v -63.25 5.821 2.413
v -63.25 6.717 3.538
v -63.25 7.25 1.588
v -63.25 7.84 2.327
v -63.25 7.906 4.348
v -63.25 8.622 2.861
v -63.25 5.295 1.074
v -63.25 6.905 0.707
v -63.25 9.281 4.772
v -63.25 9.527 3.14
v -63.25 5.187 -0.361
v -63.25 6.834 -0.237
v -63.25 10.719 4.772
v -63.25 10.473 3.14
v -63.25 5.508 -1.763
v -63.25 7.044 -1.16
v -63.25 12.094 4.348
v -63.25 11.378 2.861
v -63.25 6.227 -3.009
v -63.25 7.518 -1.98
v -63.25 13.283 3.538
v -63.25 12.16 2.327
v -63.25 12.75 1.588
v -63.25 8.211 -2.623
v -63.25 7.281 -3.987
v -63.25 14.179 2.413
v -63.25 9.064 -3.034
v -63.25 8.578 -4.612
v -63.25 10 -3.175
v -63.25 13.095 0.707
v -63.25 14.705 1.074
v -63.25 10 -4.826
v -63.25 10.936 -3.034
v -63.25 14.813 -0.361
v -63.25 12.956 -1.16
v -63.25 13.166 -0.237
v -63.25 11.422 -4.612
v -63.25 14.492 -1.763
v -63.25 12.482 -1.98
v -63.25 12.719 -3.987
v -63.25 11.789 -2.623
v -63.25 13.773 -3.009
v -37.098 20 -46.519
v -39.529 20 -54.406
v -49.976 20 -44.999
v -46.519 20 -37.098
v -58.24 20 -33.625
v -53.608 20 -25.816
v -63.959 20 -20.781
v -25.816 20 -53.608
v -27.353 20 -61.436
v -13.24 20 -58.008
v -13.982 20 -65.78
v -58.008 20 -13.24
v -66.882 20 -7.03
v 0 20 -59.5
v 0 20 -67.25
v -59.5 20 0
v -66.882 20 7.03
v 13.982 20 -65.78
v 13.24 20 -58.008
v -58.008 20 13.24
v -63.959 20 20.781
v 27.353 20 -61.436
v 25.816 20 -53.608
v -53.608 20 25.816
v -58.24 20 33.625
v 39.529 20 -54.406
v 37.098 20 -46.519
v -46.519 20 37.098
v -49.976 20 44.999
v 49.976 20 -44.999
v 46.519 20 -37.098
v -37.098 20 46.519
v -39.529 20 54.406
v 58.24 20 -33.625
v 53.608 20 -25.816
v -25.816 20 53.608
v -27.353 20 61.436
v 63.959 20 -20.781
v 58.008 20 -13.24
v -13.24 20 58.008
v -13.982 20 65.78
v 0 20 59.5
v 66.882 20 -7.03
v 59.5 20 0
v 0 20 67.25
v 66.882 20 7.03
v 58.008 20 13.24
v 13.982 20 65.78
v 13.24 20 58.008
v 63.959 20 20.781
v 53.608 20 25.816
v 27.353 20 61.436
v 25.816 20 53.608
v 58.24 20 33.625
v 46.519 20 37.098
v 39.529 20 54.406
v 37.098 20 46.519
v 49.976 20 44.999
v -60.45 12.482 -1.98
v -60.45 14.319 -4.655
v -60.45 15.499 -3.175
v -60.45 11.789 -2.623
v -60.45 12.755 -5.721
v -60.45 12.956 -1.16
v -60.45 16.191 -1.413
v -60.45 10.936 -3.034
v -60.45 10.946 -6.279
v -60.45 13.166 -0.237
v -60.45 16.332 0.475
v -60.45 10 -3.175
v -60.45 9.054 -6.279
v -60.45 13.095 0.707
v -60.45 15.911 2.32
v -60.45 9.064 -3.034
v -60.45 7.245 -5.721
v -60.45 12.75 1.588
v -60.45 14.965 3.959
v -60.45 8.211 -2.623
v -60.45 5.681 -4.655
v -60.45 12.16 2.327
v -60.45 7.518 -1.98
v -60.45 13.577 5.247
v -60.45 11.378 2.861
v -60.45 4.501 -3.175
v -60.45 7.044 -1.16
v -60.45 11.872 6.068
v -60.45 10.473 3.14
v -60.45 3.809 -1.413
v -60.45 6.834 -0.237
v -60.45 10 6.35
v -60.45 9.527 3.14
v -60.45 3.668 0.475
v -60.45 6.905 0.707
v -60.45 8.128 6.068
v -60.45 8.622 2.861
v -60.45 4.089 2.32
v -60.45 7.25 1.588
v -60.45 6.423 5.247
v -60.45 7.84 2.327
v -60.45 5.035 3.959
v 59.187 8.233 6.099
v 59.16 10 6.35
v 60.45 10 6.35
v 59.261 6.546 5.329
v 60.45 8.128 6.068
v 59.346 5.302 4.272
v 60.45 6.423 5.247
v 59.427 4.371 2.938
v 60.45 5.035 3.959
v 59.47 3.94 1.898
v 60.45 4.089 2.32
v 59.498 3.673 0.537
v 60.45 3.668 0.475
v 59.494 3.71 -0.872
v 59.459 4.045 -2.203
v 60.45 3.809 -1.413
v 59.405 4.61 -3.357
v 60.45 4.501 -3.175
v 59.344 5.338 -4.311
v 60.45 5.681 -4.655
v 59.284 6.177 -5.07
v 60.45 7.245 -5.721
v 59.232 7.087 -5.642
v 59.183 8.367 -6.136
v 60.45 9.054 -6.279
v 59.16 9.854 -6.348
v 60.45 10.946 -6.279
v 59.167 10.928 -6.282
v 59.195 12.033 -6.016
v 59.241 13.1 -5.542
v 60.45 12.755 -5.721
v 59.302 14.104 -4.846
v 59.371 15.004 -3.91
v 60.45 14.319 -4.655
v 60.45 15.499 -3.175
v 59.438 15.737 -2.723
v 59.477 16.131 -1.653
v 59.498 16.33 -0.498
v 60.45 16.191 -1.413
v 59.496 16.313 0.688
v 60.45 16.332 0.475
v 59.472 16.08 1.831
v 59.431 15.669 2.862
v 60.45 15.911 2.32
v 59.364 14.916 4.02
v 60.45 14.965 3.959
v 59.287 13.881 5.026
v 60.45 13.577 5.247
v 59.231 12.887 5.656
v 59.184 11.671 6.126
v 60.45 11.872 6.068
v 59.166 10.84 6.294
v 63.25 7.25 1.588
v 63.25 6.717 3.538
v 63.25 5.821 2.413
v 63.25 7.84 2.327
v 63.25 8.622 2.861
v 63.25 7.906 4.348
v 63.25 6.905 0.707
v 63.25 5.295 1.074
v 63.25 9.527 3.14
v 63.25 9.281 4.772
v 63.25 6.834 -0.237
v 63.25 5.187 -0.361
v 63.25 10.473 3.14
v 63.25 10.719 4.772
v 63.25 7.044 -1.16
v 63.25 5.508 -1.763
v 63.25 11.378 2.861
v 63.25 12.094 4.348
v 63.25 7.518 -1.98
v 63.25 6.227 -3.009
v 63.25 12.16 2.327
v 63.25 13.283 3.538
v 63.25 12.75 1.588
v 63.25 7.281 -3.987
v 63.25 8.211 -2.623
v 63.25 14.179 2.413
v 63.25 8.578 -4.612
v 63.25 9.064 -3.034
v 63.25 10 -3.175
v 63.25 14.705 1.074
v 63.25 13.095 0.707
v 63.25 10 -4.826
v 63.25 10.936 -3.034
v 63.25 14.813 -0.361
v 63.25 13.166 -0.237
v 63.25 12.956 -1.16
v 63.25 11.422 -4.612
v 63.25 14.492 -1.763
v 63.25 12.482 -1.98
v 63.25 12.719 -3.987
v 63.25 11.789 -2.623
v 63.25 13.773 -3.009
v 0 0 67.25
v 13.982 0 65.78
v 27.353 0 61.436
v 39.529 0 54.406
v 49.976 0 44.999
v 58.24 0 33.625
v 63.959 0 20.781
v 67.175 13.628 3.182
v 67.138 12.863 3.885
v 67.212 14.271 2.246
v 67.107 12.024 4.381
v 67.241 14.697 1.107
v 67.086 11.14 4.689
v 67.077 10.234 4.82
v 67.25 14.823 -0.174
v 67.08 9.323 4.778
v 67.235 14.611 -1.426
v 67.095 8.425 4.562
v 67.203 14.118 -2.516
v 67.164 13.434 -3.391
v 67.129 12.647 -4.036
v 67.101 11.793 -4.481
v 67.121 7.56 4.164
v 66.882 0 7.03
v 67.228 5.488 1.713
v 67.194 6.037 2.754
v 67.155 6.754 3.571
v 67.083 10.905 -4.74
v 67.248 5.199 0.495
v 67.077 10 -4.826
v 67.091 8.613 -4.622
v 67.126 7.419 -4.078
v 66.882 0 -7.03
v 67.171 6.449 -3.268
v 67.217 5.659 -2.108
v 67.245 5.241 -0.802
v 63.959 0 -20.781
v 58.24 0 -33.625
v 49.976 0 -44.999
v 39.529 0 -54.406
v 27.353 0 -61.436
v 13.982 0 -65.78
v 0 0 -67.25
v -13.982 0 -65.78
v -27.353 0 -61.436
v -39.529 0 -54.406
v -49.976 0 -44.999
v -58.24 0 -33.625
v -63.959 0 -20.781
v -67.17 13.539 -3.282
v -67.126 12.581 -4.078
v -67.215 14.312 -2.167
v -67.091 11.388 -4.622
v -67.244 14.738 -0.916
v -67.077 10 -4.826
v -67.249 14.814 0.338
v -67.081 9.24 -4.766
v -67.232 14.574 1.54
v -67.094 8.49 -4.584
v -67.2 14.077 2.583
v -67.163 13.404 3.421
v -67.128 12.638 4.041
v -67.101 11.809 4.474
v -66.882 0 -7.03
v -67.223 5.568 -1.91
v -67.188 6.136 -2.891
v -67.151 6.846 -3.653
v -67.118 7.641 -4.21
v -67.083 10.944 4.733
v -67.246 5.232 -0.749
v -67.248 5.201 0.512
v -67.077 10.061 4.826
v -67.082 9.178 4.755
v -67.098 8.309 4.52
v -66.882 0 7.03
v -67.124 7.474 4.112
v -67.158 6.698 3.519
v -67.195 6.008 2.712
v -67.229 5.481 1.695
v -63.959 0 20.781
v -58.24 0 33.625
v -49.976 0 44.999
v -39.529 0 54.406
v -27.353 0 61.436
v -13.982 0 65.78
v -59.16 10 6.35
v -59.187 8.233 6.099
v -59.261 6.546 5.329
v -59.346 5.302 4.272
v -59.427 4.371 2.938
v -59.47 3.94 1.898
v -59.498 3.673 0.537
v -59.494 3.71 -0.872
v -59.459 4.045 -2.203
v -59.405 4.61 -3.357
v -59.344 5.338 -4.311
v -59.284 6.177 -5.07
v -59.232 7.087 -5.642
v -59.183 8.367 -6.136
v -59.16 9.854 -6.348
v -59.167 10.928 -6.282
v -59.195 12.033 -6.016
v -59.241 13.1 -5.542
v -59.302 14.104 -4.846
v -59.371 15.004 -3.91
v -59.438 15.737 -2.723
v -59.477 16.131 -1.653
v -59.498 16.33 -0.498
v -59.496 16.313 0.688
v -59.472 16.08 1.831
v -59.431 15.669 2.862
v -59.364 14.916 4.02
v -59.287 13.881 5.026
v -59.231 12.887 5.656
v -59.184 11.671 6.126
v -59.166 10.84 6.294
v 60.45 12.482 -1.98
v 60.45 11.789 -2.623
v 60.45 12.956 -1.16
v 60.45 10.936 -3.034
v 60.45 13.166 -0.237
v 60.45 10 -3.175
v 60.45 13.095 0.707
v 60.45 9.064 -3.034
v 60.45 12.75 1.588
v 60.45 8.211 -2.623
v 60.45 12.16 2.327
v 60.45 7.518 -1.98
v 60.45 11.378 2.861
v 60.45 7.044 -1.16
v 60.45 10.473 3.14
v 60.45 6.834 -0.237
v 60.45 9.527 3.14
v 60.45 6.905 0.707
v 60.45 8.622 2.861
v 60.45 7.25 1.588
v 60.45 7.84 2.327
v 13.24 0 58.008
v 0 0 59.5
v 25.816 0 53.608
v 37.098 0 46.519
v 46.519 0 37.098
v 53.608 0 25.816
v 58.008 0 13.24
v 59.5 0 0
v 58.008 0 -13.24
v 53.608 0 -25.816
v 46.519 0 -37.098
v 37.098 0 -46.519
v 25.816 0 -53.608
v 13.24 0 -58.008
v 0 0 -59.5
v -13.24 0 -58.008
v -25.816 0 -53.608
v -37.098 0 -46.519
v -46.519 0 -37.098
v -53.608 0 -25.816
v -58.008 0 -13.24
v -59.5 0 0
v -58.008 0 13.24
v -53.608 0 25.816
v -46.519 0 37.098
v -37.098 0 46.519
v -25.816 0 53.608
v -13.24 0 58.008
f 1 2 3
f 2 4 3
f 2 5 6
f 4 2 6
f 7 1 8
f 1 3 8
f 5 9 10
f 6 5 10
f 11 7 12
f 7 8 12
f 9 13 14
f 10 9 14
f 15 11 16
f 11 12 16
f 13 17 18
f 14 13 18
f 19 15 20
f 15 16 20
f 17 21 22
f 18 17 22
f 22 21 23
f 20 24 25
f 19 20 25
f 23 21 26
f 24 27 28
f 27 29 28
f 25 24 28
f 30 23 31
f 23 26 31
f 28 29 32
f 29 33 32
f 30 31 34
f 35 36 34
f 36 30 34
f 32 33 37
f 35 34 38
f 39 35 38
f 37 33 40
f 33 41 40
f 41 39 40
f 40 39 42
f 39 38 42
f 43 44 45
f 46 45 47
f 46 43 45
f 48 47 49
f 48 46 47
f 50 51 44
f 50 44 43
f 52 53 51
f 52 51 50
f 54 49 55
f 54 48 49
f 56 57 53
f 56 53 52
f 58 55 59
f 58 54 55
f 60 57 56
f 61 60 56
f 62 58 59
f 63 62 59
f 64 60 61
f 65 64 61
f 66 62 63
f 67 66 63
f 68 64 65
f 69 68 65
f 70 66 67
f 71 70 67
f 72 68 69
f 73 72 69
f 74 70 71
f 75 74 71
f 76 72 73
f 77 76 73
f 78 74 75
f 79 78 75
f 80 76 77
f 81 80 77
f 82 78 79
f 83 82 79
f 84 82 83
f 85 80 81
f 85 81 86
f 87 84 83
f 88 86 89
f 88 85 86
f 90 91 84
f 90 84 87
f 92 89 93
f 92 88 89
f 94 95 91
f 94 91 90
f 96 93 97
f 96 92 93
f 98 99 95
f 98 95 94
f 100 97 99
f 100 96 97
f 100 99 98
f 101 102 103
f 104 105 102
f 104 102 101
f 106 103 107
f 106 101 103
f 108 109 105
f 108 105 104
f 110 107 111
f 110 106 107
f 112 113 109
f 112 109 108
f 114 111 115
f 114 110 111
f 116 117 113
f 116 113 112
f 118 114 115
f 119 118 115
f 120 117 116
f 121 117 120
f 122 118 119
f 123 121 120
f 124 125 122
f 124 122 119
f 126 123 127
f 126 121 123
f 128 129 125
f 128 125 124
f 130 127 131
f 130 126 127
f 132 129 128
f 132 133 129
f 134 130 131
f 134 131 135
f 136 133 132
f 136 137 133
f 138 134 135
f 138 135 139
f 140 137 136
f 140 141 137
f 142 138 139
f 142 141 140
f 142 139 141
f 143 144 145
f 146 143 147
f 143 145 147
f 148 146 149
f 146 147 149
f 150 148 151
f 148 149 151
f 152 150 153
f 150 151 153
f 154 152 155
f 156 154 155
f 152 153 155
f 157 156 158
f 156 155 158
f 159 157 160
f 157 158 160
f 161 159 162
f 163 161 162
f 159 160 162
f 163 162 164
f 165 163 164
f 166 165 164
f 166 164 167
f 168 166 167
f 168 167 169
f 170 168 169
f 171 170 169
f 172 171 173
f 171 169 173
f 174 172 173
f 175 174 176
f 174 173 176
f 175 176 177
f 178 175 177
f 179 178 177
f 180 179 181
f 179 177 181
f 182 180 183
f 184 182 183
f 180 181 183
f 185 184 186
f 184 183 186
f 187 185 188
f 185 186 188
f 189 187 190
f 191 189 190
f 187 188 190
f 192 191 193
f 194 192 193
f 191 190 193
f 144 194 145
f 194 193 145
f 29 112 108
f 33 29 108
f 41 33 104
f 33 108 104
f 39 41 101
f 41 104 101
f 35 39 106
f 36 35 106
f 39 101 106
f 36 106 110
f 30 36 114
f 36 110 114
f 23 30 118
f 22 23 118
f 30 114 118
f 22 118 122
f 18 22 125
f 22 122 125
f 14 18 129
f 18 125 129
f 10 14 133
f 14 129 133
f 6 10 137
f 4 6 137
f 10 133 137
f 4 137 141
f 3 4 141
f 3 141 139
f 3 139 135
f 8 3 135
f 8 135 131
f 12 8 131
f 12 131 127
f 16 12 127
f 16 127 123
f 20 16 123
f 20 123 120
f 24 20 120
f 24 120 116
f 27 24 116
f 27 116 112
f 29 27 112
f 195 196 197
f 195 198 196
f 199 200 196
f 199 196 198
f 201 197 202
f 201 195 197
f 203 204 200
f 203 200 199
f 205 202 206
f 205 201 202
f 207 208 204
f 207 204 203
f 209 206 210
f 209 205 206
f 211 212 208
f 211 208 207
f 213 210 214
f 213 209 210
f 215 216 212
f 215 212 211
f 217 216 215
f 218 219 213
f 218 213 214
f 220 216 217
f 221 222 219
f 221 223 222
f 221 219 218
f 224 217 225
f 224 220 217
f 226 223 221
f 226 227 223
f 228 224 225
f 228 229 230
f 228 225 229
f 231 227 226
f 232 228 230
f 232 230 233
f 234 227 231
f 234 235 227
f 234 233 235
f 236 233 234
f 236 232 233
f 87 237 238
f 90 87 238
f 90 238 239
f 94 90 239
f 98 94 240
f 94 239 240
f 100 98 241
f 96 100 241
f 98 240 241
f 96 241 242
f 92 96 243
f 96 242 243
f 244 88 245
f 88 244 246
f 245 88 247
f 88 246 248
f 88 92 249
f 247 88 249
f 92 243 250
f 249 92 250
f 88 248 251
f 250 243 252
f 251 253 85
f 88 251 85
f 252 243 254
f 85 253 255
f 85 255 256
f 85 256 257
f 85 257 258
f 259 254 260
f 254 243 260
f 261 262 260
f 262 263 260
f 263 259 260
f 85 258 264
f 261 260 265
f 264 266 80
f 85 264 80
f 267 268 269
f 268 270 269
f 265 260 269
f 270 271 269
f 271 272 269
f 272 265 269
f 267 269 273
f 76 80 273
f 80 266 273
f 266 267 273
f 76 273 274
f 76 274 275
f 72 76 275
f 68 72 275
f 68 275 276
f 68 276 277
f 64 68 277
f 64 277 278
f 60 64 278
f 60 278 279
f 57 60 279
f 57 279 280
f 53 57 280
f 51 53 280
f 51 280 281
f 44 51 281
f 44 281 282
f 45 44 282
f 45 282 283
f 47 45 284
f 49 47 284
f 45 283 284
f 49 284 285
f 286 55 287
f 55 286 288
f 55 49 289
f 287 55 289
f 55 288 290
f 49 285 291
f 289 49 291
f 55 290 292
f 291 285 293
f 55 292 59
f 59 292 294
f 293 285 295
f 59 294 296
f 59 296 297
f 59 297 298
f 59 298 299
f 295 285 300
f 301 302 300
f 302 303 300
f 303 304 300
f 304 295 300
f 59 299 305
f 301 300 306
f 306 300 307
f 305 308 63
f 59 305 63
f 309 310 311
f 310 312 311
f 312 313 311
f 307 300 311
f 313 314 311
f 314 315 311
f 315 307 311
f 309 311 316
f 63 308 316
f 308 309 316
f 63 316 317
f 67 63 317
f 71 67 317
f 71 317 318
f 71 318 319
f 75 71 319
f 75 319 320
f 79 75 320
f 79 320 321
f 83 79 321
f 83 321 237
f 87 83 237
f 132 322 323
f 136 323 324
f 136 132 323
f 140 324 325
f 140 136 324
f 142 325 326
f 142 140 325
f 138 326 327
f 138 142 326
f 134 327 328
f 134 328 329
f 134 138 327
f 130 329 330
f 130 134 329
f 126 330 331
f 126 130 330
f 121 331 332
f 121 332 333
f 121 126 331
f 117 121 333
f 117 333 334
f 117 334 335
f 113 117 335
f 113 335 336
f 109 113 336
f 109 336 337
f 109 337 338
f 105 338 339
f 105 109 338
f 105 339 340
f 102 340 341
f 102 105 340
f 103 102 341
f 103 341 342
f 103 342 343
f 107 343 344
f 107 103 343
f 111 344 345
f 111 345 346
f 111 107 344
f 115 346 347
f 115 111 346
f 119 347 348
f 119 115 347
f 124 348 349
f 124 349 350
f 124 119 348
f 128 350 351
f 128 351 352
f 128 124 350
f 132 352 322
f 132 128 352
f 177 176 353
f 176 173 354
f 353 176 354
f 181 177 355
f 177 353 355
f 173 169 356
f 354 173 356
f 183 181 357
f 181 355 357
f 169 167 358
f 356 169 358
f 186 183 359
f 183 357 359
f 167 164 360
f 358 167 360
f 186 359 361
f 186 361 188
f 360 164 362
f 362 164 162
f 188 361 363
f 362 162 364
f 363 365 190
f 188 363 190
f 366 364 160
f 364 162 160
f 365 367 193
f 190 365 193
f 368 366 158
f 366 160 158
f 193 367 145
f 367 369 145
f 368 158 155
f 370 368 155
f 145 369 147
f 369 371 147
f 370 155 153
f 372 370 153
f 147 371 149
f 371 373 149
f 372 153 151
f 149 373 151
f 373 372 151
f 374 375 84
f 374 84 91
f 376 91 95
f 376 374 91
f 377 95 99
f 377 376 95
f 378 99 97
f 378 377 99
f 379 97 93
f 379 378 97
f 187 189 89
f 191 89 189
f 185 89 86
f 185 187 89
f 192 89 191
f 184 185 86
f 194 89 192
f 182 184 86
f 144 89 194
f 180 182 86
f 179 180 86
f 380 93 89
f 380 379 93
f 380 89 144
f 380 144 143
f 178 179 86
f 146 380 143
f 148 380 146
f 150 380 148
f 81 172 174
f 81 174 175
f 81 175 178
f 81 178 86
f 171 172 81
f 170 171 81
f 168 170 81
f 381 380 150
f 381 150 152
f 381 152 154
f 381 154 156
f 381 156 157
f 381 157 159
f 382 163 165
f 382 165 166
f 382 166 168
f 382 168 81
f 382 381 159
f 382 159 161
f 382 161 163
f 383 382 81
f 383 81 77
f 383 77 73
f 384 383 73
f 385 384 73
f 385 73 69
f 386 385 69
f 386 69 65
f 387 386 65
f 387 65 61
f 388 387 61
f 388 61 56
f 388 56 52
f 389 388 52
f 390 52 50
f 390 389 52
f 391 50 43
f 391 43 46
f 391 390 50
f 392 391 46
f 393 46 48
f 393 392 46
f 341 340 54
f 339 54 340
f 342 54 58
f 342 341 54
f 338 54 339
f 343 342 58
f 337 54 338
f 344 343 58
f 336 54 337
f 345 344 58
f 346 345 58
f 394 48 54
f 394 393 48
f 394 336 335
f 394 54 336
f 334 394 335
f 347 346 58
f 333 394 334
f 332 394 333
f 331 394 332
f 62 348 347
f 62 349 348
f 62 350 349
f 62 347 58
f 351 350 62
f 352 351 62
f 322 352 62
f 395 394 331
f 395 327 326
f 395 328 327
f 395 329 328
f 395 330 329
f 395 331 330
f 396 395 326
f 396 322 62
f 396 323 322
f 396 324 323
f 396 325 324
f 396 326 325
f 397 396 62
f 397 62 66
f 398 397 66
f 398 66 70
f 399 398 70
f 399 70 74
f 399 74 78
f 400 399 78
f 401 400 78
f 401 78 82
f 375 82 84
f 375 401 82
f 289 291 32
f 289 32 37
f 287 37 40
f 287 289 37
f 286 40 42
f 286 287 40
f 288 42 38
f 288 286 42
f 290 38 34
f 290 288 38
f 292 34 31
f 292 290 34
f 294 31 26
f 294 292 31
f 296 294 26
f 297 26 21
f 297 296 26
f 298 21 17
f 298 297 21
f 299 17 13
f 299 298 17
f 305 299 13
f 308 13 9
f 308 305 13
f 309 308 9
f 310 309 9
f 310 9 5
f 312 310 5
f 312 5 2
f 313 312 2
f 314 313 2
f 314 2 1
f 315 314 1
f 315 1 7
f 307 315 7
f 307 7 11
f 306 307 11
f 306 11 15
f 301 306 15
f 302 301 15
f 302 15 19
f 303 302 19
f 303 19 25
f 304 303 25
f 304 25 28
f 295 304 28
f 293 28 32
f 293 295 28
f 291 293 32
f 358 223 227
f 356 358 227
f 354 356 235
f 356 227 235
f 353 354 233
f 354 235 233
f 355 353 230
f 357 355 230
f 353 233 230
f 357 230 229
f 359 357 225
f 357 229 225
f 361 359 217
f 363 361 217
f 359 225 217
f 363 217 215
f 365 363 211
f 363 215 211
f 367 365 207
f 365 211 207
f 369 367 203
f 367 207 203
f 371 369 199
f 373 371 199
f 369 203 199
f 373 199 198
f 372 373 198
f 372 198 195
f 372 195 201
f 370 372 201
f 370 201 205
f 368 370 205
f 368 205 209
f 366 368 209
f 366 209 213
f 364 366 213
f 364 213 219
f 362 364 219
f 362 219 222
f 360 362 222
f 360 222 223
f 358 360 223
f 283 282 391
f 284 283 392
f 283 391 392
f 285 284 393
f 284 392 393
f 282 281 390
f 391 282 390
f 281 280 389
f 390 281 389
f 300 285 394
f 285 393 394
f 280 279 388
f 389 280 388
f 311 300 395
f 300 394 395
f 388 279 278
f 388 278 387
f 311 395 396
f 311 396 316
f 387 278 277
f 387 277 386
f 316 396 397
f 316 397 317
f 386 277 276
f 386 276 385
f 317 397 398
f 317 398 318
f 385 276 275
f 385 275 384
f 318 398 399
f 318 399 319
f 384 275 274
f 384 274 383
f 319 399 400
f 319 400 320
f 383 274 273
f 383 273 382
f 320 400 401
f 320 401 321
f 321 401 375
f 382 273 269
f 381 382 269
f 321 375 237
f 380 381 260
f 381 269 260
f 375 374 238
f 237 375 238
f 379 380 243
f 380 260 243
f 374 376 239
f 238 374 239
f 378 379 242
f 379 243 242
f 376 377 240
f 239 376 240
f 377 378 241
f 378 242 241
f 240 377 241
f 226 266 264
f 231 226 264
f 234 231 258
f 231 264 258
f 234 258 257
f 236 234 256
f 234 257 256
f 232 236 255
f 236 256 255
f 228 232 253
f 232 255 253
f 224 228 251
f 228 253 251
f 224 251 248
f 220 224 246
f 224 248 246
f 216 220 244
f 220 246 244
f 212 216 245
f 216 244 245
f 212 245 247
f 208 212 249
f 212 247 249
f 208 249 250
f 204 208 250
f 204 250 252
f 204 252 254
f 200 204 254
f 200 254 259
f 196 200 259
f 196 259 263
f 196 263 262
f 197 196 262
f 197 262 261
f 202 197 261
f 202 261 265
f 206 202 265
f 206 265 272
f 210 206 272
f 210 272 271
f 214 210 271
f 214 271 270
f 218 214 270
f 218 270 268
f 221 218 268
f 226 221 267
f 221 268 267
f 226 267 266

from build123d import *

# Parameters (mm, degrees)
SKETCH1_R           = 67.25
SKETCH1_R_2         = 59.5
BOSS_EXTRUDE1_DEPTH = 20
SKETCH4_R           = 3.175
CUT_EXTRUDE2_DEPTH  = 200
SKETCH5_R           = 4.826
CUT_EXTRUDE3_DEPTH  = 4
SKETCH6_R           = 6.35
CUT_EXTRUDE4_DEPTH  = 1


with BuildPart() as part:
    # Sketch1 → Boss-Extrude1 (new body)
    with BuildSketch(Plane(origin=(0, 0, 0), x_dir=(1, 0, 0), z_dir=(0, 1, 0))):
        Circle(SKETCH1_R)
        Circle(SKETCH1_R_2, mode=Mode.SUBTRACT)
    extrude(amount=BOSS_EXTRUDE1_DEPTH)

    # Sketch4 → Cut-Extrude2 (cut)
    with BuildSketch(Plane(origin=(67.25, 0, 0), x_dir=(0, 0, -1), z_dir=(1, 0, 0))):
        with Locations((0, 10)):
            Circle(SKETCH4_R)
    extrude(amount=-CUT_EXTRUDE2_DEPTH, mode=Mode.SUBTRACT)

    # Sketch5 → Cut-Extrude3 (cut)
    with BuildSketch(Plane(origin=(67.25, 0, 0), x_dir=(0, 0, -1), z_dir=(1, 0, 0))):
        with Locations((0, 10)):
            Circle(SKETCH5_R)
    cut_extrude3 = extrude(amount=-CUT_EXTRUDE3_DEPTH, mode=Mode.SUBTRACT)

    # Mirror1: Cut-Extrude3 across plane
    add(cut_extrude3.mirror(Plane(origin=(0, 0, 0), x_dir=(0, 0, 1), z_dir=(1, 0, 0))), mode=Mode.SUBTRACT)

    # Sketch6 → Cut-Extrude4 (cut, symmetric)
    with BuildSketch(Plane(origin=(59.45, 0, 0), x_dir=(0, 0, -1), z_dir=(1, 0, 0))):
        with Locations((0, 10)):
            Circle(SKETCH6_R)
    cut_extrude4 = extrude(amount=CUT_EXTRUDE4_DEPTH, both=True, mode=Mode.SUBTRACT)

    # Mirror2: Cut-Extrude4 across plane
    add(cut_extrude4.mirror(Plane(origin=(0, 0, 0), x_dir=(0, 0, 1), z_dir=(1, 0, 0))), mode=Mode.SUBTRACT)


solid = part.part
